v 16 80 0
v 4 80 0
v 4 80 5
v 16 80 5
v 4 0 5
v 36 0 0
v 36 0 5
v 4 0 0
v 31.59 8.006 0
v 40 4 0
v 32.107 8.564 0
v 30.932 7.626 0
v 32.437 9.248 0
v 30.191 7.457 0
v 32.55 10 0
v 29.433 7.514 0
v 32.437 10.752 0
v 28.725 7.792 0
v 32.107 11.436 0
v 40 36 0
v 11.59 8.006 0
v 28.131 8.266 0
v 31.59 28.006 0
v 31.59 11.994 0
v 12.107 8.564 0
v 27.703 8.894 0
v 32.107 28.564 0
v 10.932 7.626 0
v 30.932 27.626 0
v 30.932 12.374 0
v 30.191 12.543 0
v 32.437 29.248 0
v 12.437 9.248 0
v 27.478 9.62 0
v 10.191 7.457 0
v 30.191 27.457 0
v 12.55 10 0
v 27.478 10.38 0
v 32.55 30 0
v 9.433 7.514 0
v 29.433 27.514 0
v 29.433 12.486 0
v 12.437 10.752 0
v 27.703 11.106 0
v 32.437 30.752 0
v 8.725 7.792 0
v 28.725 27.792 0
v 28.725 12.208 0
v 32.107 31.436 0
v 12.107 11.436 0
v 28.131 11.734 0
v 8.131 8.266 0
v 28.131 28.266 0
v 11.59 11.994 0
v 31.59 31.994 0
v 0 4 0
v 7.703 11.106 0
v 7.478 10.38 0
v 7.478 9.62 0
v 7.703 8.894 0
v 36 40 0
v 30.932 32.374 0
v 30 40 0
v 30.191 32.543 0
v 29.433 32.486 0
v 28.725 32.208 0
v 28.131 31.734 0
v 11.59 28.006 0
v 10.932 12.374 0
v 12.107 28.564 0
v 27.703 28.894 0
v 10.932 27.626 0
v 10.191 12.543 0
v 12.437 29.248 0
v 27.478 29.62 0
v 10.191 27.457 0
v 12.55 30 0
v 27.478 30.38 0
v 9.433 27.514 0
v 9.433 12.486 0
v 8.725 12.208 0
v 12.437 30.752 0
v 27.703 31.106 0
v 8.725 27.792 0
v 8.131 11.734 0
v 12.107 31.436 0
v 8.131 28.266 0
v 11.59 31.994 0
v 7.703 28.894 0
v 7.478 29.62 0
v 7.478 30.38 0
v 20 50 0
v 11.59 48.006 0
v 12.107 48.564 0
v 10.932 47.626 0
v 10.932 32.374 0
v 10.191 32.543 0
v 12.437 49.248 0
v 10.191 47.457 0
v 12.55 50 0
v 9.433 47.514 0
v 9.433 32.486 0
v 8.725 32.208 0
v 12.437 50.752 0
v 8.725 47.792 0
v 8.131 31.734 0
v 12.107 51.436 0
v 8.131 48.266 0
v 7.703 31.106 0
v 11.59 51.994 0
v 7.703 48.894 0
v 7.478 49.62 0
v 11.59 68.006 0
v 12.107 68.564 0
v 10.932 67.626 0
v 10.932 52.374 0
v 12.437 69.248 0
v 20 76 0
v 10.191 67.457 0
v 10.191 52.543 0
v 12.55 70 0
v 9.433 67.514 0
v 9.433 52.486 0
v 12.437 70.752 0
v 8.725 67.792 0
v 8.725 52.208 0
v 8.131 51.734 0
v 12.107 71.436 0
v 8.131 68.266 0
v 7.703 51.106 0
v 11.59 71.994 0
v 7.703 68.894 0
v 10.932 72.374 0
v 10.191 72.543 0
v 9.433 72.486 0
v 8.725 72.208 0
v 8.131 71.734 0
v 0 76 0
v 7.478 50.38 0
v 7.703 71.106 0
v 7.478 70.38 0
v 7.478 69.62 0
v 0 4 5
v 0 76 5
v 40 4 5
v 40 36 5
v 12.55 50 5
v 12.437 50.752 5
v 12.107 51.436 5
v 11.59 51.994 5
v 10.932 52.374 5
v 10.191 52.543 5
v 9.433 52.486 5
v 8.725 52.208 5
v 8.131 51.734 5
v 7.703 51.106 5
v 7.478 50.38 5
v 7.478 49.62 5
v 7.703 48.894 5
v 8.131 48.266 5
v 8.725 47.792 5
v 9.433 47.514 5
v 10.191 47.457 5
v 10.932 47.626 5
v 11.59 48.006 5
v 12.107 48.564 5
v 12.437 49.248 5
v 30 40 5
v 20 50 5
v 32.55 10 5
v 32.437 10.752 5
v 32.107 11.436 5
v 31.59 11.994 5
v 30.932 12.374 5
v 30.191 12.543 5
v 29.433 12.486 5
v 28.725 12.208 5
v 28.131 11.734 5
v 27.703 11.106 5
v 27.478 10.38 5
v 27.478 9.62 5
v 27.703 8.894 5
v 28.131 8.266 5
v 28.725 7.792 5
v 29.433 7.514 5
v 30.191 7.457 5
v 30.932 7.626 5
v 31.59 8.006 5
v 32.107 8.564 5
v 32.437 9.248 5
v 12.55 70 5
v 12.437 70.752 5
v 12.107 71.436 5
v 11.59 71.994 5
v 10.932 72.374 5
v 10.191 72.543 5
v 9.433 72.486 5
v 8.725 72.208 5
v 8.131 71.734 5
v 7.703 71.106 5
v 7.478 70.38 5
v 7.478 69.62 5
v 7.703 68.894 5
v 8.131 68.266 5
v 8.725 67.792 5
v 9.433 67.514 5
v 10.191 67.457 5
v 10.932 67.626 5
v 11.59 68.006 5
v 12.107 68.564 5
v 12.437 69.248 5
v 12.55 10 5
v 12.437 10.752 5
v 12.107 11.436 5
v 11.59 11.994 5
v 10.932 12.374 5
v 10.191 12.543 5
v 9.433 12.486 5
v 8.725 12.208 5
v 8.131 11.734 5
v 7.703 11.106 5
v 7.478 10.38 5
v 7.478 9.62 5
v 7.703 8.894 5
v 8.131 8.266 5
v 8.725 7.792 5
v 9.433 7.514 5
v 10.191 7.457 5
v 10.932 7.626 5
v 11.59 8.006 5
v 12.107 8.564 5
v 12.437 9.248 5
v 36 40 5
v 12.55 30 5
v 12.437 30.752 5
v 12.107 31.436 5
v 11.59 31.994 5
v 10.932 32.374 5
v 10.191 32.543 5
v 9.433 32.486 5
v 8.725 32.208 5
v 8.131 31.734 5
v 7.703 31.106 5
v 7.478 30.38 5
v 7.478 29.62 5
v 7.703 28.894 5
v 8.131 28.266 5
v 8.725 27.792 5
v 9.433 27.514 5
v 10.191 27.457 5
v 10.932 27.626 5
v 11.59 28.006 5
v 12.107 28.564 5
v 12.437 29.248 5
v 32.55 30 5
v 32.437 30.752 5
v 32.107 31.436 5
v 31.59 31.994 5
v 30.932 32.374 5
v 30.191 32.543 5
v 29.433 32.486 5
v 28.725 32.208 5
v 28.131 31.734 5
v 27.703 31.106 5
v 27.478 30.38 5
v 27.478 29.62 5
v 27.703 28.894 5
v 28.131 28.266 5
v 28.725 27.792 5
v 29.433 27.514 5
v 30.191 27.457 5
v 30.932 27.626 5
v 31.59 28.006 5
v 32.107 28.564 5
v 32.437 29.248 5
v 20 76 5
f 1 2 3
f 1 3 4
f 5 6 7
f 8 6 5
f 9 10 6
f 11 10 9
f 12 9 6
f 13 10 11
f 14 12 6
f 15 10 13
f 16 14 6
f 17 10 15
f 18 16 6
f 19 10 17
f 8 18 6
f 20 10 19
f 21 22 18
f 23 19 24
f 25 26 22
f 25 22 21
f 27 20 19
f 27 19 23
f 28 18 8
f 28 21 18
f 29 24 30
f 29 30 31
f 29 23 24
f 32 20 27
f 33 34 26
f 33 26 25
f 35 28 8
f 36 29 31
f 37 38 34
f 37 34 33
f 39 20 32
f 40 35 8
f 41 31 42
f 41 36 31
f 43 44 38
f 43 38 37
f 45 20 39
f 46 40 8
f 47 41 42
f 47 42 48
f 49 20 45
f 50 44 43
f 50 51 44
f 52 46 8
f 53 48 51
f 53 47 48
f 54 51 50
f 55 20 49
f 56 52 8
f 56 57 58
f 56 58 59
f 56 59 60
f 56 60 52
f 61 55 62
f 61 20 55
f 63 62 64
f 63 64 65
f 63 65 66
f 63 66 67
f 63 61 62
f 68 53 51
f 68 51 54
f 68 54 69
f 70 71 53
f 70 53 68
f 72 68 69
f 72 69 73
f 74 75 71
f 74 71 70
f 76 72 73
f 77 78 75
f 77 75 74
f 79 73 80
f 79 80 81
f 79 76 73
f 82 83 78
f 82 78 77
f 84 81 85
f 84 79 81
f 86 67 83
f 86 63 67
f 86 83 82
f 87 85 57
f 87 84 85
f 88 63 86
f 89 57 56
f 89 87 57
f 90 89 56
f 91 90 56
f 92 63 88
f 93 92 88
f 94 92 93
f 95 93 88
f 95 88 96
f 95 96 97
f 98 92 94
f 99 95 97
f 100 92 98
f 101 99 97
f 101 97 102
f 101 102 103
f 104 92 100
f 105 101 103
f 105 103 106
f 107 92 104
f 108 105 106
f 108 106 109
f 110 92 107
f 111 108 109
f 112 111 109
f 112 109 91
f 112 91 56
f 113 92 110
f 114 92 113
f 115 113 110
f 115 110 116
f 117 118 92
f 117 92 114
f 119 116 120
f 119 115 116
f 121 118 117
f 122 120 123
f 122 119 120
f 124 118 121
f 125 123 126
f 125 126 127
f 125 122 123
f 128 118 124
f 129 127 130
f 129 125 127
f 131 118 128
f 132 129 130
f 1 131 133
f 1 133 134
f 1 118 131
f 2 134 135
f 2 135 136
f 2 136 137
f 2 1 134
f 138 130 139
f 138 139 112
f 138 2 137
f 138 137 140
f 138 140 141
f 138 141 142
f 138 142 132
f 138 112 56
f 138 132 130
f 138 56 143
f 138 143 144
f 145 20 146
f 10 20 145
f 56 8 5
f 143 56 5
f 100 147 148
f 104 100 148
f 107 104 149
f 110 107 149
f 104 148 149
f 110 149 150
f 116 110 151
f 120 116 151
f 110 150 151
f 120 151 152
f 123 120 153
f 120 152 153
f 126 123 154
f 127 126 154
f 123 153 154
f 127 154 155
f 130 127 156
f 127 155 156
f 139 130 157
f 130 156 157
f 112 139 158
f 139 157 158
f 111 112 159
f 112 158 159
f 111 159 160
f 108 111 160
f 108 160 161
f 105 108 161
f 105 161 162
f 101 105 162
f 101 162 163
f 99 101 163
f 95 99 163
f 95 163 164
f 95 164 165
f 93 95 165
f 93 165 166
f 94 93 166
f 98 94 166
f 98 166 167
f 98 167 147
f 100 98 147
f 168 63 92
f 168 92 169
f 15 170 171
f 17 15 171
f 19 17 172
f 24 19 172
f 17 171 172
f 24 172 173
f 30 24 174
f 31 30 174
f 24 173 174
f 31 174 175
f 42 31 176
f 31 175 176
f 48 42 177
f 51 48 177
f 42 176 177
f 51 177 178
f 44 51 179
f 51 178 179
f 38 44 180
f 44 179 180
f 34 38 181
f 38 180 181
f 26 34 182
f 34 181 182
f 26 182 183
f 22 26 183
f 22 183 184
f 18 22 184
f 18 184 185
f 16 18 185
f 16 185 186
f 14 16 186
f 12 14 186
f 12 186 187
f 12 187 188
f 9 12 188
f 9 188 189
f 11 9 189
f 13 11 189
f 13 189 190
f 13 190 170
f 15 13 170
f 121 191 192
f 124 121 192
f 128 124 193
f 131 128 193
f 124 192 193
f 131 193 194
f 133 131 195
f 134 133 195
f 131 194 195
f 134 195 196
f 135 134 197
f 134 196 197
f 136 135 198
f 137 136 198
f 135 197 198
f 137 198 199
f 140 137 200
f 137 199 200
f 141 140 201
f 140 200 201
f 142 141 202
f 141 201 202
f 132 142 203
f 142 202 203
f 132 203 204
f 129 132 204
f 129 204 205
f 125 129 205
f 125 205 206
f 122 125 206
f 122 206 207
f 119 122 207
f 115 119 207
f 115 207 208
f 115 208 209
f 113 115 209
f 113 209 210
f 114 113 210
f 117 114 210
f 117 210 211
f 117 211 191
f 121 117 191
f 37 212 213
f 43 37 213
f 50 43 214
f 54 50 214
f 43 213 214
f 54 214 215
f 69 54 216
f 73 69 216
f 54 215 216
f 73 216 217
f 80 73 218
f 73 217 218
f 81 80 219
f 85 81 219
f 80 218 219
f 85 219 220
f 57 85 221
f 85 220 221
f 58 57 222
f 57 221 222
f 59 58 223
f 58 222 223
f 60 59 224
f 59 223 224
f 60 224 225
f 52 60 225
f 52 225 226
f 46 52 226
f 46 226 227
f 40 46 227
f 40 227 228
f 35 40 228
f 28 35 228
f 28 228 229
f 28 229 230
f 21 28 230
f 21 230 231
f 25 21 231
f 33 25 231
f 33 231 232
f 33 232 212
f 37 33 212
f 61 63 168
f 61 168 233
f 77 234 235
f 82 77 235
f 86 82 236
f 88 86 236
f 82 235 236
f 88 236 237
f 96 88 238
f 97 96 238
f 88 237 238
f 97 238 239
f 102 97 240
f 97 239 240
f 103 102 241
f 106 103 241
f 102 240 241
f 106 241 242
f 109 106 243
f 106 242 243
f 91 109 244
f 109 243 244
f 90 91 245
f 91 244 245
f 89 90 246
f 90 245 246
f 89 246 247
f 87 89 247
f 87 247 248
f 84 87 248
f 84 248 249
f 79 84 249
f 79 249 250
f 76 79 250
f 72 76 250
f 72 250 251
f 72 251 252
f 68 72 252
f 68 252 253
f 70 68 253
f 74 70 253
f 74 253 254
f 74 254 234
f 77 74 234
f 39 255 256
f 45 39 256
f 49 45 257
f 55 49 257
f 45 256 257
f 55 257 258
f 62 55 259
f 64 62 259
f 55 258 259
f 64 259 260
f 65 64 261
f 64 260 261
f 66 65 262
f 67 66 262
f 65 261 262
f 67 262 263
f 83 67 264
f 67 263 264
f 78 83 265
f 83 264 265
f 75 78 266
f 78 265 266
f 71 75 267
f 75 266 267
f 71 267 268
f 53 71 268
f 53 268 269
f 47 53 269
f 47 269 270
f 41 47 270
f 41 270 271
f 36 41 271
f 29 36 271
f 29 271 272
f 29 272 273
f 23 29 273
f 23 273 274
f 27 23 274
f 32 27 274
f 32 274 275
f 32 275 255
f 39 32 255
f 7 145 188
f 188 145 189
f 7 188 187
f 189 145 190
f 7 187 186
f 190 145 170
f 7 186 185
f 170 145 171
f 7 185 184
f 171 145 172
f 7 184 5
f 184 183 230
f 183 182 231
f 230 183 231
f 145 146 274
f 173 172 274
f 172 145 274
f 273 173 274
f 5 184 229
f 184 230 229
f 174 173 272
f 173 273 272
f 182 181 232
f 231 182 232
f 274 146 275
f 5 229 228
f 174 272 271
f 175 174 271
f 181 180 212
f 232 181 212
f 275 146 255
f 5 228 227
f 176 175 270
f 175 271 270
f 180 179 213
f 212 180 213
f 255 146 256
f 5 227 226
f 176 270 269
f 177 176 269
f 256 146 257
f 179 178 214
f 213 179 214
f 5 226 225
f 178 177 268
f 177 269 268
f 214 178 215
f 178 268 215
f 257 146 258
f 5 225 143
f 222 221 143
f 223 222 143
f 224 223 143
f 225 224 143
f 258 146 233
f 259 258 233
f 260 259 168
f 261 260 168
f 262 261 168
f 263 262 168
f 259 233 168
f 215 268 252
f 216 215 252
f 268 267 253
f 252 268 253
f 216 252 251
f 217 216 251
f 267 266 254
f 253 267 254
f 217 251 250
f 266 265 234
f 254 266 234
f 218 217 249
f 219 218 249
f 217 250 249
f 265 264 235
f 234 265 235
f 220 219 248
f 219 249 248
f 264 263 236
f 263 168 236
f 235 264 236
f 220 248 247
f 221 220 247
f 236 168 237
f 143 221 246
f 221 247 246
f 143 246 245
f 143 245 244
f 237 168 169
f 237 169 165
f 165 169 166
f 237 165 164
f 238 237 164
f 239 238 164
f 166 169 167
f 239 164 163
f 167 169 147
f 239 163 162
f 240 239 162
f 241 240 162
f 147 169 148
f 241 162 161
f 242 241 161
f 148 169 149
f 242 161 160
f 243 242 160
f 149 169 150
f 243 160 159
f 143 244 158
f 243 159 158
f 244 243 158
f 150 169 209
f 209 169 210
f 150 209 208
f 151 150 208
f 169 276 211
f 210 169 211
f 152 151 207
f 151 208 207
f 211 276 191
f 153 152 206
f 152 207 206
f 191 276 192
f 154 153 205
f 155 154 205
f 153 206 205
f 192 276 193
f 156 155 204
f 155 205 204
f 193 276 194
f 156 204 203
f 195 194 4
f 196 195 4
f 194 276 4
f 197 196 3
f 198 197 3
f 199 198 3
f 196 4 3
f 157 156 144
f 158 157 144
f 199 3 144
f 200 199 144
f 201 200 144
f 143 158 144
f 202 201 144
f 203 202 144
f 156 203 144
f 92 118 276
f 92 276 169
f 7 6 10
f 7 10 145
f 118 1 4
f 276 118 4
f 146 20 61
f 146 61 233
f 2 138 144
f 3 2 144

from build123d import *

# Parameters (mm, degrees)
BOSS_EXTRUDE1_DEPTH = 5
SKETCH2_R           = 2.55
CUT_EXTRUDE1_DEPTH  = 10
CHAMFER1_SIZE       = 10
CHAMFER2_SIZE       = 4
CHAMFER3_SIZE       = 4


with BuildPart() as part:
    # Sketch1 → Boss-Extrude1 (new body)
    with BuildSketch(Plane.XY):
        Polygon((0, 0), (0, 80), (20, 80), (20, 40), (40, 40), (40, 0), align=None)
    extrude(amount=BOSS_EXTRUDE1_DEPTH)

    # Sketch2 → Cut-Extrude1 (cut)
    with BuildSketch(Plane.XY.offset(5)):
        with Locations((10, 70)):
            Circle(SKETCH2_R)
        with Locations((10, 50)):
            Circle(SKETCH2_R)
        with Locations((10, 30)):
            Circle(SKETCH2_R)
        with Locations((10, 10)):
            Circle(SKETCH2_R)
        with Locations((30, 30)):
            Circle(SKETCH2_R)
        with Locations((30, 10)):
            Circle(SKETCH2_R)
    extrude(amount=-CUT_EXTRUDE1_DEPTH, mode=Mode.SUBTRACT)

    # Chamfer1
    chamfer1_edges = [part.edges().sort_by_distance(p)[0] for p in [
        (20, 40, 2.5),
    ]]
    chamfer(chamfer1_edges, length=CHAMFER1_SIZE)

    # Chamfer2
    chamfer2_edges = [part.edges().sort_by_distance(p)[0] for p in [
        (20, 80, 2.5),
    ]]
    chamfer(chamfer2_edges, length=CHAMFER2_SIZE)

    # Chamfer3
    chamfer3_edges = [part.edges().sort_by_distance(p)[0] for p in [
        (0, 0, 2.5),
        (0, 80, 2.5),
        (40, 40, 2.5),
        (40, 0, 2.5),
    ]]
    chamfer(chamfer3_edges, length=CHAMFER3_SIZE)


solid = part.part
